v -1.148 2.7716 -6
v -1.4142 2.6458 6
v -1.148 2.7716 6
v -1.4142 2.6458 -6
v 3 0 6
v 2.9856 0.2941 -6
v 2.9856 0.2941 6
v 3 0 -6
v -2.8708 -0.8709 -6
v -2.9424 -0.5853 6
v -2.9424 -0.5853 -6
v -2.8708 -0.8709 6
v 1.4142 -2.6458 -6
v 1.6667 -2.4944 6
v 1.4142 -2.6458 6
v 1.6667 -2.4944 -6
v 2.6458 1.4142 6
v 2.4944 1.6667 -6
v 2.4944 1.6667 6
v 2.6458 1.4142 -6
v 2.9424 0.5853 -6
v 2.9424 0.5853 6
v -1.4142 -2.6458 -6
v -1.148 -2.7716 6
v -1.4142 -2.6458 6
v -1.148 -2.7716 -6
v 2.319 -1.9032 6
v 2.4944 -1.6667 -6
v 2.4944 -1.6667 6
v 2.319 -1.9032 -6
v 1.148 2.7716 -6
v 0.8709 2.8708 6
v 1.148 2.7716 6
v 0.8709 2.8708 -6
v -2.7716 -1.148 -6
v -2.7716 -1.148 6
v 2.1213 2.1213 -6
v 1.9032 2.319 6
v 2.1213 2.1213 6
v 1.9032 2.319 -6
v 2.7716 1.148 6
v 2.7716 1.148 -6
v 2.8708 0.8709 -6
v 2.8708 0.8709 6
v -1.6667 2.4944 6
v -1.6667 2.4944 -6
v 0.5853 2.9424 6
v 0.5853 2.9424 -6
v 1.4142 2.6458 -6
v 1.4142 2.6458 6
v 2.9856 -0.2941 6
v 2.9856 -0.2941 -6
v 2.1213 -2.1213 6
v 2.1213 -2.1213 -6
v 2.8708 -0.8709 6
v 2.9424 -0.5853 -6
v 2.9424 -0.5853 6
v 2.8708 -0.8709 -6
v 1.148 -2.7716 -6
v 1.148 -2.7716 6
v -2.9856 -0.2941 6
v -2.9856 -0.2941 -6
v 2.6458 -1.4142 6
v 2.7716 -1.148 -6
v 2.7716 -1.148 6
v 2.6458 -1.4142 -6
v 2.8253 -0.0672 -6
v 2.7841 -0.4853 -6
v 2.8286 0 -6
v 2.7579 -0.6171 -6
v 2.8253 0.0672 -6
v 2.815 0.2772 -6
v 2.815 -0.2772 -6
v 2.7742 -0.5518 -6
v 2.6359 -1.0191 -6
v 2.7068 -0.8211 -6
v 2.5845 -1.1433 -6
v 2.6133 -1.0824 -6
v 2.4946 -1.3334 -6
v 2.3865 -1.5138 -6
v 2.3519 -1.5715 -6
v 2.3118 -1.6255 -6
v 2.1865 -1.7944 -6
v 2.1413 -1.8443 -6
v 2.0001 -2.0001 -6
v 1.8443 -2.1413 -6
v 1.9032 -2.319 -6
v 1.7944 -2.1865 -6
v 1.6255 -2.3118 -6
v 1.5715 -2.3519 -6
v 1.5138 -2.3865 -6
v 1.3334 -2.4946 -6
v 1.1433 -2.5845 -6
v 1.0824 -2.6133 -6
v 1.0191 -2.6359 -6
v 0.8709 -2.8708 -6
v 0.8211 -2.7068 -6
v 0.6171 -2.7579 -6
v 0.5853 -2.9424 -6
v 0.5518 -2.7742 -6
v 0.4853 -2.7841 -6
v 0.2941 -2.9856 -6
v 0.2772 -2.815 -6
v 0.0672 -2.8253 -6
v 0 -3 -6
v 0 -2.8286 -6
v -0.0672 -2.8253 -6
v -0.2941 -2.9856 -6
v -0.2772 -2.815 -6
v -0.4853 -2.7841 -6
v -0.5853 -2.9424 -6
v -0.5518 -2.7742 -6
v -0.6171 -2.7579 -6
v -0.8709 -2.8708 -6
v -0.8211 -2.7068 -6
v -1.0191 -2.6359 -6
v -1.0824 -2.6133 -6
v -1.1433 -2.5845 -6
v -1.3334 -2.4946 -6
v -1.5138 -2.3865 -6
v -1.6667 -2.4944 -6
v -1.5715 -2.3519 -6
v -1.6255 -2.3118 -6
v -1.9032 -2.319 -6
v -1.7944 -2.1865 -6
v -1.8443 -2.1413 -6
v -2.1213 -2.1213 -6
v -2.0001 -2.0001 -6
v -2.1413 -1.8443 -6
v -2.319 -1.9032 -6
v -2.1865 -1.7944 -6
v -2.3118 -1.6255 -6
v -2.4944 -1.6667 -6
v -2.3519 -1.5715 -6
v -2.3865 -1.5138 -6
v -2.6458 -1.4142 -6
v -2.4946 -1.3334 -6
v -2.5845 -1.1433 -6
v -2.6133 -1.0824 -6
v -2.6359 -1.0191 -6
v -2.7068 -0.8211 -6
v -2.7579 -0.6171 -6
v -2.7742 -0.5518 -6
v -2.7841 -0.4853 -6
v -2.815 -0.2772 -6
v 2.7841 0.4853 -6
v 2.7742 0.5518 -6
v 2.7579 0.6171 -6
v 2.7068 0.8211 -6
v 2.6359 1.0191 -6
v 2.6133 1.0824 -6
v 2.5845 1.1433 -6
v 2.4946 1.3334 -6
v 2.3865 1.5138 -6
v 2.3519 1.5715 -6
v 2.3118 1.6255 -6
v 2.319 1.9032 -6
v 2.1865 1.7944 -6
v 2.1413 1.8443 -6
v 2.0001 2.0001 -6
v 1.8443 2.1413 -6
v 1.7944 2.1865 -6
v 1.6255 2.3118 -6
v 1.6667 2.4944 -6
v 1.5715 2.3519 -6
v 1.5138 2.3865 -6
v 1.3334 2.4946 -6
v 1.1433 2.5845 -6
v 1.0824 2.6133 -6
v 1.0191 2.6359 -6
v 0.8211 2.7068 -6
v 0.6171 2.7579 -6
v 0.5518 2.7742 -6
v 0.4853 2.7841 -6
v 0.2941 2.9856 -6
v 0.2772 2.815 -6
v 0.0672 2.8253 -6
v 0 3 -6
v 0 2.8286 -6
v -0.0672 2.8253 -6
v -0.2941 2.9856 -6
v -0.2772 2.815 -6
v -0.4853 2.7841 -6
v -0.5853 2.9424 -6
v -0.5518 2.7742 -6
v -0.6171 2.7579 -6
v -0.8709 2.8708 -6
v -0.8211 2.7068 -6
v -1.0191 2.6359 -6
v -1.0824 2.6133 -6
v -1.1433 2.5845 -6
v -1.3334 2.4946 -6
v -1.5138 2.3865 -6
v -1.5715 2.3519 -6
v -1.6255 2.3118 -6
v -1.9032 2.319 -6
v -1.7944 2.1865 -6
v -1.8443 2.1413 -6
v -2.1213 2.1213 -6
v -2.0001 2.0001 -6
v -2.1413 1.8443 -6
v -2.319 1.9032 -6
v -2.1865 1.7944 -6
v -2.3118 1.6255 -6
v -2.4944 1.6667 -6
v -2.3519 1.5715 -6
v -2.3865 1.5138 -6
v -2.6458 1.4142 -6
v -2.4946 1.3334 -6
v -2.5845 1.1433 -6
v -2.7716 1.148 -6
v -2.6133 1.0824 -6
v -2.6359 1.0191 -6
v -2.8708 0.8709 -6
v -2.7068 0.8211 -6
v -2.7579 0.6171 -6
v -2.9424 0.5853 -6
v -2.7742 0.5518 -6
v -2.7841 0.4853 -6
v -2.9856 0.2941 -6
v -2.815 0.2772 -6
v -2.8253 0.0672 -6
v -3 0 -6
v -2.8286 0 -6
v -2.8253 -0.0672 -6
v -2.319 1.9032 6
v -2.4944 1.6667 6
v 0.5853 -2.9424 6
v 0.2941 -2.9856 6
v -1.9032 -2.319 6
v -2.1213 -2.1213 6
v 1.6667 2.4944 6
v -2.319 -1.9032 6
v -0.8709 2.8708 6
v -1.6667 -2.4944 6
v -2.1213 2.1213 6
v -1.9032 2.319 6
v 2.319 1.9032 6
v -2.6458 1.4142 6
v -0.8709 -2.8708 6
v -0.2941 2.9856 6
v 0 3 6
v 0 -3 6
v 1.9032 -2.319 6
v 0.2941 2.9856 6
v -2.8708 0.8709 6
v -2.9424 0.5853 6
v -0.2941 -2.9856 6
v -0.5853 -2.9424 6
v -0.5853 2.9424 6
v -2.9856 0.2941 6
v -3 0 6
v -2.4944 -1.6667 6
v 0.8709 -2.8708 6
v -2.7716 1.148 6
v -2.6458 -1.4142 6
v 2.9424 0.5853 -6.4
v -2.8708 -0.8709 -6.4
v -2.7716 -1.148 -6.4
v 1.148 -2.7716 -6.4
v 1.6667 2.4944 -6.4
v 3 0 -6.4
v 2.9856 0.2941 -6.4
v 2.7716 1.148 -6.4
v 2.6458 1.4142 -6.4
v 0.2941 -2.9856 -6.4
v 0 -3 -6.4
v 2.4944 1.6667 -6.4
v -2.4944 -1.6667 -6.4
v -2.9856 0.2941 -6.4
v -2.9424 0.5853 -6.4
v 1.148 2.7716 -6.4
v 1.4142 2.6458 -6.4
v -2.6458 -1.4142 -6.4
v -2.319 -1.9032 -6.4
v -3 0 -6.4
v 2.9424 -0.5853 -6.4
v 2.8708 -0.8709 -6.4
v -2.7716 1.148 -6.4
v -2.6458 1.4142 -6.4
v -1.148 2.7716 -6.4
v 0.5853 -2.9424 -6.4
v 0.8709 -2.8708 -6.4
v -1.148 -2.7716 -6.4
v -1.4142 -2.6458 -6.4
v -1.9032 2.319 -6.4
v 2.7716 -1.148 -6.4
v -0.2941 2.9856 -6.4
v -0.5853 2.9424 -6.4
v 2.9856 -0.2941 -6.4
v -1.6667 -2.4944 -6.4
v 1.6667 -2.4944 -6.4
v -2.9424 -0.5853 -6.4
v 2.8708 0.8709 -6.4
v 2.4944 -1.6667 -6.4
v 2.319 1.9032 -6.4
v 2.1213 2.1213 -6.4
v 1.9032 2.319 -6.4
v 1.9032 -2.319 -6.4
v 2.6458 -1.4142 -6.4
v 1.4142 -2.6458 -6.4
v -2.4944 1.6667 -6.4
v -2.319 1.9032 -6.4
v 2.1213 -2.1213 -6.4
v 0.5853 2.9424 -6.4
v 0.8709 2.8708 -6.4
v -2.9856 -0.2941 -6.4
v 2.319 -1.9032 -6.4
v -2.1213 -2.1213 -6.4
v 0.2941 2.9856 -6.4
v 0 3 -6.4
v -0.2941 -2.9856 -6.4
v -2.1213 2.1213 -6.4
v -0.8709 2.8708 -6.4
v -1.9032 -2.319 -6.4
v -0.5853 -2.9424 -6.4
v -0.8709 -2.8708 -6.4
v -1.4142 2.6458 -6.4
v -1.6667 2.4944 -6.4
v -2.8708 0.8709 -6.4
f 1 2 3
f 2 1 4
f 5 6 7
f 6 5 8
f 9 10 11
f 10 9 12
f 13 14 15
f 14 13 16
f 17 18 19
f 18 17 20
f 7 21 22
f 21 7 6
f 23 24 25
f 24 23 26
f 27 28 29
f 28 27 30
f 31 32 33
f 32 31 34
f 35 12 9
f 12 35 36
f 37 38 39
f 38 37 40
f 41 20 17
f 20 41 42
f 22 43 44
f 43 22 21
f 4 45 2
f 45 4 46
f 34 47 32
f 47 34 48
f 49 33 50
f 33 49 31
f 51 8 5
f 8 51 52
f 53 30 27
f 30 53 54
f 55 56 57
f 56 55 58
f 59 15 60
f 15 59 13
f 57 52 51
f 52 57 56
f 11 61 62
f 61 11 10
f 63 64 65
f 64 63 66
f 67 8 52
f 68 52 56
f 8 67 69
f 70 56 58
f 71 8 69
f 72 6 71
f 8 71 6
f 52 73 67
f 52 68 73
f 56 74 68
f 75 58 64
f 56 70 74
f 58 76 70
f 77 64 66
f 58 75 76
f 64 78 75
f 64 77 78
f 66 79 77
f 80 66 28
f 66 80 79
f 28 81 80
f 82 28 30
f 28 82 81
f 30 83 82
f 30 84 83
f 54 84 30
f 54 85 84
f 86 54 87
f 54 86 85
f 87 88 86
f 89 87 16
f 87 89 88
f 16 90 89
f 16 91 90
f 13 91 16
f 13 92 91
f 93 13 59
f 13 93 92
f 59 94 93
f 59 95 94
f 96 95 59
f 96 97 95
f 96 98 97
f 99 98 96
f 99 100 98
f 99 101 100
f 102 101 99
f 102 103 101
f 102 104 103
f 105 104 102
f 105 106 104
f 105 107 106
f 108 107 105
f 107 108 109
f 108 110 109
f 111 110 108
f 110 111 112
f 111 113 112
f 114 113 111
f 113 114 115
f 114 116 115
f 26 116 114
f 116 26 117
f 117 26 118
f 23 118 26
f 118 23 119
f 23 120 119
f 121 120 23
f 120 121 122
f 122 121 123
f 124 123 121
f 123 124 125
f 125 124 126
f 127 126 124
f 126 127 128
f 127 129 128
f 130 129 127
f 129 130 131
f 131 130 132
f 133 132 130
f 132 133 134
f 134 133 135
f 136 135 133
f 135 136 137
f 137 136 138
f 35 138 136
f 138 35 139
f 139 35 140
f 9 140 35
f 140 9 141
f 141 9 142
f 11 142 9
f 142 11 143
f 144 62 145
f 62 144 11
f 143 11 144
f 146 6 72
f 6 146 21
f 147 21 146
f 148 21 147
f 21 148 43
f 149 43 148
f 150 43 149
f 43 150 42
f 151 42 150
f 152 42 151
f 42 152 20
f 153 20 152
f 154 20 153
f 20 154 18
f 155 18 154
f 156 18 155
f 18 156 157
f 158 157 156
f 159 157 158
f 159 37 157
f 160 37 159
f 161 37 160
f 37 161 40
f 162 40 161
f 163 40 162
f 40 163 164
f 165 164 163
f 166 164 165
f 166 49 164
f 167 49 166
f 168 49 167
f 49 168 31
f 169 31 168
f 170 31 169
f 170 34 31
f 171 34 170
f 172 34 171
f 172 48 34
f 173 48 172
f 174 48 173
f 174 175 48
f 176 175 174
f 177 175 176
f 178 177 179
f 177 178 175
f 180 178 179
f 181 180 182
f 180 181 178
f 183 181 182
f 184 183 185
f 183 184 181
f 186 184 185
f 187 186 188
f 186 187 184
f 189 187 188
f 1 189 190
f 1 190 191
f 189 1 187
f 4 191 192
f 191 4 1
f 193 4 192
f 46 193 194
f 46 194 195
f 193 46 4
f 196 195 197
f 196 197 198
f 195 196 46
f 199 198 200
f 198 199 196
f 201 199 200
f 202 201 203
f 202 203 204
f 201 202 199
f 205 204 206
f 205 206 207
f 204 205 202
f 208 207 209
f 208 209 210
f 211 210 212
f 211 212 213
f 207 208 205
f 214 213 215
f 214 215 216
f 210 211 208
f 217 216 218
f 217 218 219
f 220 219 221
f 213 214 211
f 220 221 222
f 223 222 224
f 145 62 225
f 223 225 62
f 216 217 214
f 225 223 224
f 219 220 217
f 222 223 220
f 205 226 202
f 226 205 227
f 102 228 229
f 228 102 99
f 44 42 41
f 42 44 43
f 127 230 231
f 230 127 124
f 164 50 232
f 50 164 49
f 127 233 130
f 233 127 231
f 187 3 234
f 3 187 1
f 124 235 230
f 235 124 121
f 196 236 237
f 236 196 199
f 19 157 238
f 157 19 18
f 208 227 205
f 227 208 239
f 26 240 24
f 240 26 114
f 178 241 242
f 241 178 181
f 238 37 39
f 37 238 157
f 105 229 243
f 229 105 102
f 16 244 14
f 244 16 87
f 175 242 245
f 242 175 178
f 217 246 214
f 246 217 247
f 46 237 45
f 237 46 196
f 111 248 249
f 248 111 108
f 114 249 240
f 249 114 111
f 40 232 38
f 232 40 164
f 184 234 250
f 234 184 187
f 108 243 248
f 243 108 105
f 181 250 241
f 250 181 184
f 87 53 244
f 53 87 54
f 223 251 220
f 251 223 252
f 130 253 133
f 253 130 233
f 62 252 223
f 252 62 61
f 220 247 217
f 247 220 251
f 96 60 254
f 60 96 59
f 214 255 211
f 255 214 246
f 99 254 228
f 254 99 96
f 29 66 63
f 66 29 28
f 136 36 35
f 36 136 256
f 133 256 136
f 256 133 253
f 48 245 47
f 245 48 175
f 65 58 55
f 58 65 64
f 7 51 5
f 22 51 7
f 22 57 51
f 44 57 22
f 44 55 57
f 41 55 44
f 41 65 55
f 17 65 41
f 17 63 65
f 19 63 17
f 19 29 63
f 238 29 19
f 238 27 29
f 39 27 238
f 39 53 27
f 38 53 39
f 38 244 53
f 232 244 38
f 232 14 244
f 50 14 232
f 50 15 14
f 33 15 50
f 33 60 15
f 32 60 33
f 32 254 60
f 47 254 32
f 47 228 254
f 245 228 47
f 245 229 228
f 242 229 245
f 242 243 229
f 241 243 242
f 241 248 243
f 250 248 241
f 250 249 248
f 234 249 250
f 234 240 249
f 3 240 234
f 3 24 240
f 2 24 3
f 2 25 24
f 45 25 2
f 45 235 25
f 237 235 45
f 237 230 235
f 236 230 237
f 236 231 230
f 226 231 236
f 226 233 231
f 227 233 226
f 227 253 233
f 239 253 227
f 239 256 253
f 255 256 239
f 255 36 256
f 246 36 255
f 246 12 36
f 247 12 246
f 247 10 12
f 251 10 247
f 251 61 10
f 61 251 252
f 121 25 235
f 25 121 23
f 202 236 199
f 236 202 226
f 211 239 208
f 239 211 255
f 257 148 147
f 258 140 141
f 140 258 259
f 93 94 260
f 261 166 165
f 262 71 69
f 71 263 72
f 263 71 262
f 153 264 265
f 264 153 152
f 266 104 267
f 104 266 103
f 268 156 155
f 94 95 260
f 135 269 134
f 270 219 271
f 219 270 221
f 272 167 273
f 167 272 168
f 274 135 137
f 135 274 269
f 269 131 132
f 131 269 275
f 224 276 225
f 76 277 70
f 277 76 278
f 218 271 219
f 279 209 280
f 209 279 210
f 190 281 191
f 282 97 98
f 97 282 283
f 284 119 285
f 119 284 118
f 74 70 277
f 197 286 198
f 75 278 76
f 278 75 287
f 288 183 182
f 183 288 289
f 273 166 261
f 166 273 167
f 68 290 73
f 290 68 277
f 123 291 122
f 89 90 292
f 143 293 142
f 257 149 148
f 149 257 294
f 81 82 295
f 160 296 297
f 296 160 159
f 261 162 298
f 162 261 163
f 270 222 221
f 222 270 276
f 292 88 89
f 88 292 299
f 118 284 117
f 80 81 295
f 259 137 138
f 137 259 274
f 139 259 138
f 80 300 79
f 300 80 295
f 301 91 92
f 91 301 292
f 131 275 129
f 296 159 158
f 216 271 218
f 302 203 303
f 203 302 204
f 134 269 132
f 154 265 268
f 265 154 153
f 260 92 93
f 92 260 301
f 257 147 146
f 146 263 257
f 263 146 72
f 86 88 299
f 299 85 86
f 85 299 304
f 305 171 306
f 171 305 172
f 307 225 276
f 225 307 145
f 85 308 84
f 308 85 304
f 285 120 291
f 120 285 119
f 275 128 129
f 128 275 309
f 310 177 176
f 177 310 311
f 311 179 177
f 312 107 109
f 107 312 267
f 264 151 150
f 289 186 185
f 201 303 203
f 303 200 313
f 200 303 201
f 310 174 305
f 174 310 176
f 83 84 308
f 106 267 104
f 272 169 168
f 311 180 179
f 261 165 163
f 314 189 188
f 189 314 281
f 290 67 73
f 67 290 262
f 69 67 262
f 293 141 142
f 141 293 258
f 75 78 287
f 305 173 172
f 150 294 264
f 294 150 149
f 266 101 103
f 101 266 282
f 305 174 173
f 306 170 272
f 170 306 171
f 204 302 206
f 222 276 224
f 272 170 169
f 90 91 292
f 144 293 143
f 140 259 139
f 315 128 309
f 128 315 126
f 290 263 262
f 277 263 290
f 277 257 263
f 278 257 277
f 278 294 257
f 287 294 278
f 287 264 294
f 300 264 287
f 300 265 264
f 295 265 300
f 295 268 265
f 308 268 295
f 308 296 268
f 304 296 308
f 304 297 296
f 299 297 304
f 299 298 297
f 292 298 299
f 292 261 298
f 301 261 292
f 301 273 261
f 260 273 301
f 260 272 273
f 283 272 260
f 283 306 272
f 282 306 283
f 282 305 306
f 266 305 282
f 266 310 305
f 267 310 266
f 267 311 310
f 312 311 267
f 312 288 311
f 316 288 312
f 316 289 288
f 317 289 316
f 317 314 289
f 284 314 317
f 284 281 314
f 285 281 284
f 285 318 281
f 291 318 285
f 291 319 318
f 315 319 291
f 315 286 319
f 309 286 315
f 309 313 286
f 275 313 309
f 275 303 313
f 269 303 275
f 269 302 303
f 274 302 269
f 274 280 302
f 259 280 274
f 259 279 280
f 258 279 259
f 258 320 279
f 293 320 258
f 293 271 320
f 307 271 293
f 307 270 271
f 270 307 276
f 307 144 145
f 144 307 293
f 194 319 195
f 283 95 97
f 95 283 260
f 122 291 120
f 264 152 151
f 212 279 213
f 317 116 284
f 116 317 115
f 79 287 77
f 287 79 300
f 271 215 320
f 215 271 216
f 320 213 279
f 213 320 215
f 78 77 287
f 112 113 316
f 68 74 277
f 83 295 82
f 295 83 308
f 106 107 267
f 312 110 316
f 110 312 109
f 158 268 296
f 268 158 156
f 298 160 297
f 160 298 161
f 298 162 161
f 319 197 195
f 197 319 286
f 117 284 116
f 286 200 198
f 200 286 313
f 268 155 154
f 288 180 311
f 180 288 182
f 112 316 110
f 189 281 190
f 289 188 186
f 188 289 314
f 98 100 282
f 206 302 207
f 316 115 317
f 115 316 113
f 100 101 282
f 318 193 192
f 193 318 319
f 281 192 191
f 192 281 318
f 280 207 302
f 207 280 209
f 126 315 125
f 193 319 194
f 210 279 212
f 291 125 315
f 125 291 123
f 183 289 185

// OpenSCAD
// Parameters
thread_standard = 0; //[0:0:1]
thread_size = 6; //[6:6:1]
screw_style = 0; //[0:0:1]
head_type = 0; //[0:0:1]
drive_type = 0; //[0:0:1]
length_mm = 12; //[6:24:1]
tip_type = 0; //[0:0:1]
material = 0; //[0:0:1]
show_threads = 1; //[0:1:1]
major_diameter = 6; //[5:12:0.1]
minor_diameter = 5; //[4:10:0.1]
hex_socket_af = 3; //[2:6:0.1]
hex_socket_depth = 3; //[2:6:0.1]
tip_chamfer_height = 0.6; //[0.2:1.5:0.1]
overlap = 0.8; //[0.5:2:0.1]

// Screw - complete geometry
module screw() {
  color("DimGray") {
    // Threaded Shaft
    cylinder(h=length_mm, r=major_diameter/2, center=true, $fn=64);
    
    // Hex Socket Drive
    difference() {
      cylinder(h=hex_socket_depth + overlap, r=hex_socket_af/(2*cos(30)), center=true, $fn=6);
      translate([0, 0, -(hex_socket_depth/2)]) 
        cylinder(h=hex_socket_depth + overlap, r=hex_socket_af/(2*cos(30)), center=true, $fn=6);
    }
    
    // Tip Profile
    translate([0, 0, -(length_mm/2) + (tip_chamfer_height/2)])
      cylinder(h=tip_chamfer_height + overlap, r1=major_diameter/2, r2=(major_diameter/2) - tip_chamfer_height, center=true, $fn=64);
  }
}

// Assembly
module assembly() {
  screw();
}

assembly();
